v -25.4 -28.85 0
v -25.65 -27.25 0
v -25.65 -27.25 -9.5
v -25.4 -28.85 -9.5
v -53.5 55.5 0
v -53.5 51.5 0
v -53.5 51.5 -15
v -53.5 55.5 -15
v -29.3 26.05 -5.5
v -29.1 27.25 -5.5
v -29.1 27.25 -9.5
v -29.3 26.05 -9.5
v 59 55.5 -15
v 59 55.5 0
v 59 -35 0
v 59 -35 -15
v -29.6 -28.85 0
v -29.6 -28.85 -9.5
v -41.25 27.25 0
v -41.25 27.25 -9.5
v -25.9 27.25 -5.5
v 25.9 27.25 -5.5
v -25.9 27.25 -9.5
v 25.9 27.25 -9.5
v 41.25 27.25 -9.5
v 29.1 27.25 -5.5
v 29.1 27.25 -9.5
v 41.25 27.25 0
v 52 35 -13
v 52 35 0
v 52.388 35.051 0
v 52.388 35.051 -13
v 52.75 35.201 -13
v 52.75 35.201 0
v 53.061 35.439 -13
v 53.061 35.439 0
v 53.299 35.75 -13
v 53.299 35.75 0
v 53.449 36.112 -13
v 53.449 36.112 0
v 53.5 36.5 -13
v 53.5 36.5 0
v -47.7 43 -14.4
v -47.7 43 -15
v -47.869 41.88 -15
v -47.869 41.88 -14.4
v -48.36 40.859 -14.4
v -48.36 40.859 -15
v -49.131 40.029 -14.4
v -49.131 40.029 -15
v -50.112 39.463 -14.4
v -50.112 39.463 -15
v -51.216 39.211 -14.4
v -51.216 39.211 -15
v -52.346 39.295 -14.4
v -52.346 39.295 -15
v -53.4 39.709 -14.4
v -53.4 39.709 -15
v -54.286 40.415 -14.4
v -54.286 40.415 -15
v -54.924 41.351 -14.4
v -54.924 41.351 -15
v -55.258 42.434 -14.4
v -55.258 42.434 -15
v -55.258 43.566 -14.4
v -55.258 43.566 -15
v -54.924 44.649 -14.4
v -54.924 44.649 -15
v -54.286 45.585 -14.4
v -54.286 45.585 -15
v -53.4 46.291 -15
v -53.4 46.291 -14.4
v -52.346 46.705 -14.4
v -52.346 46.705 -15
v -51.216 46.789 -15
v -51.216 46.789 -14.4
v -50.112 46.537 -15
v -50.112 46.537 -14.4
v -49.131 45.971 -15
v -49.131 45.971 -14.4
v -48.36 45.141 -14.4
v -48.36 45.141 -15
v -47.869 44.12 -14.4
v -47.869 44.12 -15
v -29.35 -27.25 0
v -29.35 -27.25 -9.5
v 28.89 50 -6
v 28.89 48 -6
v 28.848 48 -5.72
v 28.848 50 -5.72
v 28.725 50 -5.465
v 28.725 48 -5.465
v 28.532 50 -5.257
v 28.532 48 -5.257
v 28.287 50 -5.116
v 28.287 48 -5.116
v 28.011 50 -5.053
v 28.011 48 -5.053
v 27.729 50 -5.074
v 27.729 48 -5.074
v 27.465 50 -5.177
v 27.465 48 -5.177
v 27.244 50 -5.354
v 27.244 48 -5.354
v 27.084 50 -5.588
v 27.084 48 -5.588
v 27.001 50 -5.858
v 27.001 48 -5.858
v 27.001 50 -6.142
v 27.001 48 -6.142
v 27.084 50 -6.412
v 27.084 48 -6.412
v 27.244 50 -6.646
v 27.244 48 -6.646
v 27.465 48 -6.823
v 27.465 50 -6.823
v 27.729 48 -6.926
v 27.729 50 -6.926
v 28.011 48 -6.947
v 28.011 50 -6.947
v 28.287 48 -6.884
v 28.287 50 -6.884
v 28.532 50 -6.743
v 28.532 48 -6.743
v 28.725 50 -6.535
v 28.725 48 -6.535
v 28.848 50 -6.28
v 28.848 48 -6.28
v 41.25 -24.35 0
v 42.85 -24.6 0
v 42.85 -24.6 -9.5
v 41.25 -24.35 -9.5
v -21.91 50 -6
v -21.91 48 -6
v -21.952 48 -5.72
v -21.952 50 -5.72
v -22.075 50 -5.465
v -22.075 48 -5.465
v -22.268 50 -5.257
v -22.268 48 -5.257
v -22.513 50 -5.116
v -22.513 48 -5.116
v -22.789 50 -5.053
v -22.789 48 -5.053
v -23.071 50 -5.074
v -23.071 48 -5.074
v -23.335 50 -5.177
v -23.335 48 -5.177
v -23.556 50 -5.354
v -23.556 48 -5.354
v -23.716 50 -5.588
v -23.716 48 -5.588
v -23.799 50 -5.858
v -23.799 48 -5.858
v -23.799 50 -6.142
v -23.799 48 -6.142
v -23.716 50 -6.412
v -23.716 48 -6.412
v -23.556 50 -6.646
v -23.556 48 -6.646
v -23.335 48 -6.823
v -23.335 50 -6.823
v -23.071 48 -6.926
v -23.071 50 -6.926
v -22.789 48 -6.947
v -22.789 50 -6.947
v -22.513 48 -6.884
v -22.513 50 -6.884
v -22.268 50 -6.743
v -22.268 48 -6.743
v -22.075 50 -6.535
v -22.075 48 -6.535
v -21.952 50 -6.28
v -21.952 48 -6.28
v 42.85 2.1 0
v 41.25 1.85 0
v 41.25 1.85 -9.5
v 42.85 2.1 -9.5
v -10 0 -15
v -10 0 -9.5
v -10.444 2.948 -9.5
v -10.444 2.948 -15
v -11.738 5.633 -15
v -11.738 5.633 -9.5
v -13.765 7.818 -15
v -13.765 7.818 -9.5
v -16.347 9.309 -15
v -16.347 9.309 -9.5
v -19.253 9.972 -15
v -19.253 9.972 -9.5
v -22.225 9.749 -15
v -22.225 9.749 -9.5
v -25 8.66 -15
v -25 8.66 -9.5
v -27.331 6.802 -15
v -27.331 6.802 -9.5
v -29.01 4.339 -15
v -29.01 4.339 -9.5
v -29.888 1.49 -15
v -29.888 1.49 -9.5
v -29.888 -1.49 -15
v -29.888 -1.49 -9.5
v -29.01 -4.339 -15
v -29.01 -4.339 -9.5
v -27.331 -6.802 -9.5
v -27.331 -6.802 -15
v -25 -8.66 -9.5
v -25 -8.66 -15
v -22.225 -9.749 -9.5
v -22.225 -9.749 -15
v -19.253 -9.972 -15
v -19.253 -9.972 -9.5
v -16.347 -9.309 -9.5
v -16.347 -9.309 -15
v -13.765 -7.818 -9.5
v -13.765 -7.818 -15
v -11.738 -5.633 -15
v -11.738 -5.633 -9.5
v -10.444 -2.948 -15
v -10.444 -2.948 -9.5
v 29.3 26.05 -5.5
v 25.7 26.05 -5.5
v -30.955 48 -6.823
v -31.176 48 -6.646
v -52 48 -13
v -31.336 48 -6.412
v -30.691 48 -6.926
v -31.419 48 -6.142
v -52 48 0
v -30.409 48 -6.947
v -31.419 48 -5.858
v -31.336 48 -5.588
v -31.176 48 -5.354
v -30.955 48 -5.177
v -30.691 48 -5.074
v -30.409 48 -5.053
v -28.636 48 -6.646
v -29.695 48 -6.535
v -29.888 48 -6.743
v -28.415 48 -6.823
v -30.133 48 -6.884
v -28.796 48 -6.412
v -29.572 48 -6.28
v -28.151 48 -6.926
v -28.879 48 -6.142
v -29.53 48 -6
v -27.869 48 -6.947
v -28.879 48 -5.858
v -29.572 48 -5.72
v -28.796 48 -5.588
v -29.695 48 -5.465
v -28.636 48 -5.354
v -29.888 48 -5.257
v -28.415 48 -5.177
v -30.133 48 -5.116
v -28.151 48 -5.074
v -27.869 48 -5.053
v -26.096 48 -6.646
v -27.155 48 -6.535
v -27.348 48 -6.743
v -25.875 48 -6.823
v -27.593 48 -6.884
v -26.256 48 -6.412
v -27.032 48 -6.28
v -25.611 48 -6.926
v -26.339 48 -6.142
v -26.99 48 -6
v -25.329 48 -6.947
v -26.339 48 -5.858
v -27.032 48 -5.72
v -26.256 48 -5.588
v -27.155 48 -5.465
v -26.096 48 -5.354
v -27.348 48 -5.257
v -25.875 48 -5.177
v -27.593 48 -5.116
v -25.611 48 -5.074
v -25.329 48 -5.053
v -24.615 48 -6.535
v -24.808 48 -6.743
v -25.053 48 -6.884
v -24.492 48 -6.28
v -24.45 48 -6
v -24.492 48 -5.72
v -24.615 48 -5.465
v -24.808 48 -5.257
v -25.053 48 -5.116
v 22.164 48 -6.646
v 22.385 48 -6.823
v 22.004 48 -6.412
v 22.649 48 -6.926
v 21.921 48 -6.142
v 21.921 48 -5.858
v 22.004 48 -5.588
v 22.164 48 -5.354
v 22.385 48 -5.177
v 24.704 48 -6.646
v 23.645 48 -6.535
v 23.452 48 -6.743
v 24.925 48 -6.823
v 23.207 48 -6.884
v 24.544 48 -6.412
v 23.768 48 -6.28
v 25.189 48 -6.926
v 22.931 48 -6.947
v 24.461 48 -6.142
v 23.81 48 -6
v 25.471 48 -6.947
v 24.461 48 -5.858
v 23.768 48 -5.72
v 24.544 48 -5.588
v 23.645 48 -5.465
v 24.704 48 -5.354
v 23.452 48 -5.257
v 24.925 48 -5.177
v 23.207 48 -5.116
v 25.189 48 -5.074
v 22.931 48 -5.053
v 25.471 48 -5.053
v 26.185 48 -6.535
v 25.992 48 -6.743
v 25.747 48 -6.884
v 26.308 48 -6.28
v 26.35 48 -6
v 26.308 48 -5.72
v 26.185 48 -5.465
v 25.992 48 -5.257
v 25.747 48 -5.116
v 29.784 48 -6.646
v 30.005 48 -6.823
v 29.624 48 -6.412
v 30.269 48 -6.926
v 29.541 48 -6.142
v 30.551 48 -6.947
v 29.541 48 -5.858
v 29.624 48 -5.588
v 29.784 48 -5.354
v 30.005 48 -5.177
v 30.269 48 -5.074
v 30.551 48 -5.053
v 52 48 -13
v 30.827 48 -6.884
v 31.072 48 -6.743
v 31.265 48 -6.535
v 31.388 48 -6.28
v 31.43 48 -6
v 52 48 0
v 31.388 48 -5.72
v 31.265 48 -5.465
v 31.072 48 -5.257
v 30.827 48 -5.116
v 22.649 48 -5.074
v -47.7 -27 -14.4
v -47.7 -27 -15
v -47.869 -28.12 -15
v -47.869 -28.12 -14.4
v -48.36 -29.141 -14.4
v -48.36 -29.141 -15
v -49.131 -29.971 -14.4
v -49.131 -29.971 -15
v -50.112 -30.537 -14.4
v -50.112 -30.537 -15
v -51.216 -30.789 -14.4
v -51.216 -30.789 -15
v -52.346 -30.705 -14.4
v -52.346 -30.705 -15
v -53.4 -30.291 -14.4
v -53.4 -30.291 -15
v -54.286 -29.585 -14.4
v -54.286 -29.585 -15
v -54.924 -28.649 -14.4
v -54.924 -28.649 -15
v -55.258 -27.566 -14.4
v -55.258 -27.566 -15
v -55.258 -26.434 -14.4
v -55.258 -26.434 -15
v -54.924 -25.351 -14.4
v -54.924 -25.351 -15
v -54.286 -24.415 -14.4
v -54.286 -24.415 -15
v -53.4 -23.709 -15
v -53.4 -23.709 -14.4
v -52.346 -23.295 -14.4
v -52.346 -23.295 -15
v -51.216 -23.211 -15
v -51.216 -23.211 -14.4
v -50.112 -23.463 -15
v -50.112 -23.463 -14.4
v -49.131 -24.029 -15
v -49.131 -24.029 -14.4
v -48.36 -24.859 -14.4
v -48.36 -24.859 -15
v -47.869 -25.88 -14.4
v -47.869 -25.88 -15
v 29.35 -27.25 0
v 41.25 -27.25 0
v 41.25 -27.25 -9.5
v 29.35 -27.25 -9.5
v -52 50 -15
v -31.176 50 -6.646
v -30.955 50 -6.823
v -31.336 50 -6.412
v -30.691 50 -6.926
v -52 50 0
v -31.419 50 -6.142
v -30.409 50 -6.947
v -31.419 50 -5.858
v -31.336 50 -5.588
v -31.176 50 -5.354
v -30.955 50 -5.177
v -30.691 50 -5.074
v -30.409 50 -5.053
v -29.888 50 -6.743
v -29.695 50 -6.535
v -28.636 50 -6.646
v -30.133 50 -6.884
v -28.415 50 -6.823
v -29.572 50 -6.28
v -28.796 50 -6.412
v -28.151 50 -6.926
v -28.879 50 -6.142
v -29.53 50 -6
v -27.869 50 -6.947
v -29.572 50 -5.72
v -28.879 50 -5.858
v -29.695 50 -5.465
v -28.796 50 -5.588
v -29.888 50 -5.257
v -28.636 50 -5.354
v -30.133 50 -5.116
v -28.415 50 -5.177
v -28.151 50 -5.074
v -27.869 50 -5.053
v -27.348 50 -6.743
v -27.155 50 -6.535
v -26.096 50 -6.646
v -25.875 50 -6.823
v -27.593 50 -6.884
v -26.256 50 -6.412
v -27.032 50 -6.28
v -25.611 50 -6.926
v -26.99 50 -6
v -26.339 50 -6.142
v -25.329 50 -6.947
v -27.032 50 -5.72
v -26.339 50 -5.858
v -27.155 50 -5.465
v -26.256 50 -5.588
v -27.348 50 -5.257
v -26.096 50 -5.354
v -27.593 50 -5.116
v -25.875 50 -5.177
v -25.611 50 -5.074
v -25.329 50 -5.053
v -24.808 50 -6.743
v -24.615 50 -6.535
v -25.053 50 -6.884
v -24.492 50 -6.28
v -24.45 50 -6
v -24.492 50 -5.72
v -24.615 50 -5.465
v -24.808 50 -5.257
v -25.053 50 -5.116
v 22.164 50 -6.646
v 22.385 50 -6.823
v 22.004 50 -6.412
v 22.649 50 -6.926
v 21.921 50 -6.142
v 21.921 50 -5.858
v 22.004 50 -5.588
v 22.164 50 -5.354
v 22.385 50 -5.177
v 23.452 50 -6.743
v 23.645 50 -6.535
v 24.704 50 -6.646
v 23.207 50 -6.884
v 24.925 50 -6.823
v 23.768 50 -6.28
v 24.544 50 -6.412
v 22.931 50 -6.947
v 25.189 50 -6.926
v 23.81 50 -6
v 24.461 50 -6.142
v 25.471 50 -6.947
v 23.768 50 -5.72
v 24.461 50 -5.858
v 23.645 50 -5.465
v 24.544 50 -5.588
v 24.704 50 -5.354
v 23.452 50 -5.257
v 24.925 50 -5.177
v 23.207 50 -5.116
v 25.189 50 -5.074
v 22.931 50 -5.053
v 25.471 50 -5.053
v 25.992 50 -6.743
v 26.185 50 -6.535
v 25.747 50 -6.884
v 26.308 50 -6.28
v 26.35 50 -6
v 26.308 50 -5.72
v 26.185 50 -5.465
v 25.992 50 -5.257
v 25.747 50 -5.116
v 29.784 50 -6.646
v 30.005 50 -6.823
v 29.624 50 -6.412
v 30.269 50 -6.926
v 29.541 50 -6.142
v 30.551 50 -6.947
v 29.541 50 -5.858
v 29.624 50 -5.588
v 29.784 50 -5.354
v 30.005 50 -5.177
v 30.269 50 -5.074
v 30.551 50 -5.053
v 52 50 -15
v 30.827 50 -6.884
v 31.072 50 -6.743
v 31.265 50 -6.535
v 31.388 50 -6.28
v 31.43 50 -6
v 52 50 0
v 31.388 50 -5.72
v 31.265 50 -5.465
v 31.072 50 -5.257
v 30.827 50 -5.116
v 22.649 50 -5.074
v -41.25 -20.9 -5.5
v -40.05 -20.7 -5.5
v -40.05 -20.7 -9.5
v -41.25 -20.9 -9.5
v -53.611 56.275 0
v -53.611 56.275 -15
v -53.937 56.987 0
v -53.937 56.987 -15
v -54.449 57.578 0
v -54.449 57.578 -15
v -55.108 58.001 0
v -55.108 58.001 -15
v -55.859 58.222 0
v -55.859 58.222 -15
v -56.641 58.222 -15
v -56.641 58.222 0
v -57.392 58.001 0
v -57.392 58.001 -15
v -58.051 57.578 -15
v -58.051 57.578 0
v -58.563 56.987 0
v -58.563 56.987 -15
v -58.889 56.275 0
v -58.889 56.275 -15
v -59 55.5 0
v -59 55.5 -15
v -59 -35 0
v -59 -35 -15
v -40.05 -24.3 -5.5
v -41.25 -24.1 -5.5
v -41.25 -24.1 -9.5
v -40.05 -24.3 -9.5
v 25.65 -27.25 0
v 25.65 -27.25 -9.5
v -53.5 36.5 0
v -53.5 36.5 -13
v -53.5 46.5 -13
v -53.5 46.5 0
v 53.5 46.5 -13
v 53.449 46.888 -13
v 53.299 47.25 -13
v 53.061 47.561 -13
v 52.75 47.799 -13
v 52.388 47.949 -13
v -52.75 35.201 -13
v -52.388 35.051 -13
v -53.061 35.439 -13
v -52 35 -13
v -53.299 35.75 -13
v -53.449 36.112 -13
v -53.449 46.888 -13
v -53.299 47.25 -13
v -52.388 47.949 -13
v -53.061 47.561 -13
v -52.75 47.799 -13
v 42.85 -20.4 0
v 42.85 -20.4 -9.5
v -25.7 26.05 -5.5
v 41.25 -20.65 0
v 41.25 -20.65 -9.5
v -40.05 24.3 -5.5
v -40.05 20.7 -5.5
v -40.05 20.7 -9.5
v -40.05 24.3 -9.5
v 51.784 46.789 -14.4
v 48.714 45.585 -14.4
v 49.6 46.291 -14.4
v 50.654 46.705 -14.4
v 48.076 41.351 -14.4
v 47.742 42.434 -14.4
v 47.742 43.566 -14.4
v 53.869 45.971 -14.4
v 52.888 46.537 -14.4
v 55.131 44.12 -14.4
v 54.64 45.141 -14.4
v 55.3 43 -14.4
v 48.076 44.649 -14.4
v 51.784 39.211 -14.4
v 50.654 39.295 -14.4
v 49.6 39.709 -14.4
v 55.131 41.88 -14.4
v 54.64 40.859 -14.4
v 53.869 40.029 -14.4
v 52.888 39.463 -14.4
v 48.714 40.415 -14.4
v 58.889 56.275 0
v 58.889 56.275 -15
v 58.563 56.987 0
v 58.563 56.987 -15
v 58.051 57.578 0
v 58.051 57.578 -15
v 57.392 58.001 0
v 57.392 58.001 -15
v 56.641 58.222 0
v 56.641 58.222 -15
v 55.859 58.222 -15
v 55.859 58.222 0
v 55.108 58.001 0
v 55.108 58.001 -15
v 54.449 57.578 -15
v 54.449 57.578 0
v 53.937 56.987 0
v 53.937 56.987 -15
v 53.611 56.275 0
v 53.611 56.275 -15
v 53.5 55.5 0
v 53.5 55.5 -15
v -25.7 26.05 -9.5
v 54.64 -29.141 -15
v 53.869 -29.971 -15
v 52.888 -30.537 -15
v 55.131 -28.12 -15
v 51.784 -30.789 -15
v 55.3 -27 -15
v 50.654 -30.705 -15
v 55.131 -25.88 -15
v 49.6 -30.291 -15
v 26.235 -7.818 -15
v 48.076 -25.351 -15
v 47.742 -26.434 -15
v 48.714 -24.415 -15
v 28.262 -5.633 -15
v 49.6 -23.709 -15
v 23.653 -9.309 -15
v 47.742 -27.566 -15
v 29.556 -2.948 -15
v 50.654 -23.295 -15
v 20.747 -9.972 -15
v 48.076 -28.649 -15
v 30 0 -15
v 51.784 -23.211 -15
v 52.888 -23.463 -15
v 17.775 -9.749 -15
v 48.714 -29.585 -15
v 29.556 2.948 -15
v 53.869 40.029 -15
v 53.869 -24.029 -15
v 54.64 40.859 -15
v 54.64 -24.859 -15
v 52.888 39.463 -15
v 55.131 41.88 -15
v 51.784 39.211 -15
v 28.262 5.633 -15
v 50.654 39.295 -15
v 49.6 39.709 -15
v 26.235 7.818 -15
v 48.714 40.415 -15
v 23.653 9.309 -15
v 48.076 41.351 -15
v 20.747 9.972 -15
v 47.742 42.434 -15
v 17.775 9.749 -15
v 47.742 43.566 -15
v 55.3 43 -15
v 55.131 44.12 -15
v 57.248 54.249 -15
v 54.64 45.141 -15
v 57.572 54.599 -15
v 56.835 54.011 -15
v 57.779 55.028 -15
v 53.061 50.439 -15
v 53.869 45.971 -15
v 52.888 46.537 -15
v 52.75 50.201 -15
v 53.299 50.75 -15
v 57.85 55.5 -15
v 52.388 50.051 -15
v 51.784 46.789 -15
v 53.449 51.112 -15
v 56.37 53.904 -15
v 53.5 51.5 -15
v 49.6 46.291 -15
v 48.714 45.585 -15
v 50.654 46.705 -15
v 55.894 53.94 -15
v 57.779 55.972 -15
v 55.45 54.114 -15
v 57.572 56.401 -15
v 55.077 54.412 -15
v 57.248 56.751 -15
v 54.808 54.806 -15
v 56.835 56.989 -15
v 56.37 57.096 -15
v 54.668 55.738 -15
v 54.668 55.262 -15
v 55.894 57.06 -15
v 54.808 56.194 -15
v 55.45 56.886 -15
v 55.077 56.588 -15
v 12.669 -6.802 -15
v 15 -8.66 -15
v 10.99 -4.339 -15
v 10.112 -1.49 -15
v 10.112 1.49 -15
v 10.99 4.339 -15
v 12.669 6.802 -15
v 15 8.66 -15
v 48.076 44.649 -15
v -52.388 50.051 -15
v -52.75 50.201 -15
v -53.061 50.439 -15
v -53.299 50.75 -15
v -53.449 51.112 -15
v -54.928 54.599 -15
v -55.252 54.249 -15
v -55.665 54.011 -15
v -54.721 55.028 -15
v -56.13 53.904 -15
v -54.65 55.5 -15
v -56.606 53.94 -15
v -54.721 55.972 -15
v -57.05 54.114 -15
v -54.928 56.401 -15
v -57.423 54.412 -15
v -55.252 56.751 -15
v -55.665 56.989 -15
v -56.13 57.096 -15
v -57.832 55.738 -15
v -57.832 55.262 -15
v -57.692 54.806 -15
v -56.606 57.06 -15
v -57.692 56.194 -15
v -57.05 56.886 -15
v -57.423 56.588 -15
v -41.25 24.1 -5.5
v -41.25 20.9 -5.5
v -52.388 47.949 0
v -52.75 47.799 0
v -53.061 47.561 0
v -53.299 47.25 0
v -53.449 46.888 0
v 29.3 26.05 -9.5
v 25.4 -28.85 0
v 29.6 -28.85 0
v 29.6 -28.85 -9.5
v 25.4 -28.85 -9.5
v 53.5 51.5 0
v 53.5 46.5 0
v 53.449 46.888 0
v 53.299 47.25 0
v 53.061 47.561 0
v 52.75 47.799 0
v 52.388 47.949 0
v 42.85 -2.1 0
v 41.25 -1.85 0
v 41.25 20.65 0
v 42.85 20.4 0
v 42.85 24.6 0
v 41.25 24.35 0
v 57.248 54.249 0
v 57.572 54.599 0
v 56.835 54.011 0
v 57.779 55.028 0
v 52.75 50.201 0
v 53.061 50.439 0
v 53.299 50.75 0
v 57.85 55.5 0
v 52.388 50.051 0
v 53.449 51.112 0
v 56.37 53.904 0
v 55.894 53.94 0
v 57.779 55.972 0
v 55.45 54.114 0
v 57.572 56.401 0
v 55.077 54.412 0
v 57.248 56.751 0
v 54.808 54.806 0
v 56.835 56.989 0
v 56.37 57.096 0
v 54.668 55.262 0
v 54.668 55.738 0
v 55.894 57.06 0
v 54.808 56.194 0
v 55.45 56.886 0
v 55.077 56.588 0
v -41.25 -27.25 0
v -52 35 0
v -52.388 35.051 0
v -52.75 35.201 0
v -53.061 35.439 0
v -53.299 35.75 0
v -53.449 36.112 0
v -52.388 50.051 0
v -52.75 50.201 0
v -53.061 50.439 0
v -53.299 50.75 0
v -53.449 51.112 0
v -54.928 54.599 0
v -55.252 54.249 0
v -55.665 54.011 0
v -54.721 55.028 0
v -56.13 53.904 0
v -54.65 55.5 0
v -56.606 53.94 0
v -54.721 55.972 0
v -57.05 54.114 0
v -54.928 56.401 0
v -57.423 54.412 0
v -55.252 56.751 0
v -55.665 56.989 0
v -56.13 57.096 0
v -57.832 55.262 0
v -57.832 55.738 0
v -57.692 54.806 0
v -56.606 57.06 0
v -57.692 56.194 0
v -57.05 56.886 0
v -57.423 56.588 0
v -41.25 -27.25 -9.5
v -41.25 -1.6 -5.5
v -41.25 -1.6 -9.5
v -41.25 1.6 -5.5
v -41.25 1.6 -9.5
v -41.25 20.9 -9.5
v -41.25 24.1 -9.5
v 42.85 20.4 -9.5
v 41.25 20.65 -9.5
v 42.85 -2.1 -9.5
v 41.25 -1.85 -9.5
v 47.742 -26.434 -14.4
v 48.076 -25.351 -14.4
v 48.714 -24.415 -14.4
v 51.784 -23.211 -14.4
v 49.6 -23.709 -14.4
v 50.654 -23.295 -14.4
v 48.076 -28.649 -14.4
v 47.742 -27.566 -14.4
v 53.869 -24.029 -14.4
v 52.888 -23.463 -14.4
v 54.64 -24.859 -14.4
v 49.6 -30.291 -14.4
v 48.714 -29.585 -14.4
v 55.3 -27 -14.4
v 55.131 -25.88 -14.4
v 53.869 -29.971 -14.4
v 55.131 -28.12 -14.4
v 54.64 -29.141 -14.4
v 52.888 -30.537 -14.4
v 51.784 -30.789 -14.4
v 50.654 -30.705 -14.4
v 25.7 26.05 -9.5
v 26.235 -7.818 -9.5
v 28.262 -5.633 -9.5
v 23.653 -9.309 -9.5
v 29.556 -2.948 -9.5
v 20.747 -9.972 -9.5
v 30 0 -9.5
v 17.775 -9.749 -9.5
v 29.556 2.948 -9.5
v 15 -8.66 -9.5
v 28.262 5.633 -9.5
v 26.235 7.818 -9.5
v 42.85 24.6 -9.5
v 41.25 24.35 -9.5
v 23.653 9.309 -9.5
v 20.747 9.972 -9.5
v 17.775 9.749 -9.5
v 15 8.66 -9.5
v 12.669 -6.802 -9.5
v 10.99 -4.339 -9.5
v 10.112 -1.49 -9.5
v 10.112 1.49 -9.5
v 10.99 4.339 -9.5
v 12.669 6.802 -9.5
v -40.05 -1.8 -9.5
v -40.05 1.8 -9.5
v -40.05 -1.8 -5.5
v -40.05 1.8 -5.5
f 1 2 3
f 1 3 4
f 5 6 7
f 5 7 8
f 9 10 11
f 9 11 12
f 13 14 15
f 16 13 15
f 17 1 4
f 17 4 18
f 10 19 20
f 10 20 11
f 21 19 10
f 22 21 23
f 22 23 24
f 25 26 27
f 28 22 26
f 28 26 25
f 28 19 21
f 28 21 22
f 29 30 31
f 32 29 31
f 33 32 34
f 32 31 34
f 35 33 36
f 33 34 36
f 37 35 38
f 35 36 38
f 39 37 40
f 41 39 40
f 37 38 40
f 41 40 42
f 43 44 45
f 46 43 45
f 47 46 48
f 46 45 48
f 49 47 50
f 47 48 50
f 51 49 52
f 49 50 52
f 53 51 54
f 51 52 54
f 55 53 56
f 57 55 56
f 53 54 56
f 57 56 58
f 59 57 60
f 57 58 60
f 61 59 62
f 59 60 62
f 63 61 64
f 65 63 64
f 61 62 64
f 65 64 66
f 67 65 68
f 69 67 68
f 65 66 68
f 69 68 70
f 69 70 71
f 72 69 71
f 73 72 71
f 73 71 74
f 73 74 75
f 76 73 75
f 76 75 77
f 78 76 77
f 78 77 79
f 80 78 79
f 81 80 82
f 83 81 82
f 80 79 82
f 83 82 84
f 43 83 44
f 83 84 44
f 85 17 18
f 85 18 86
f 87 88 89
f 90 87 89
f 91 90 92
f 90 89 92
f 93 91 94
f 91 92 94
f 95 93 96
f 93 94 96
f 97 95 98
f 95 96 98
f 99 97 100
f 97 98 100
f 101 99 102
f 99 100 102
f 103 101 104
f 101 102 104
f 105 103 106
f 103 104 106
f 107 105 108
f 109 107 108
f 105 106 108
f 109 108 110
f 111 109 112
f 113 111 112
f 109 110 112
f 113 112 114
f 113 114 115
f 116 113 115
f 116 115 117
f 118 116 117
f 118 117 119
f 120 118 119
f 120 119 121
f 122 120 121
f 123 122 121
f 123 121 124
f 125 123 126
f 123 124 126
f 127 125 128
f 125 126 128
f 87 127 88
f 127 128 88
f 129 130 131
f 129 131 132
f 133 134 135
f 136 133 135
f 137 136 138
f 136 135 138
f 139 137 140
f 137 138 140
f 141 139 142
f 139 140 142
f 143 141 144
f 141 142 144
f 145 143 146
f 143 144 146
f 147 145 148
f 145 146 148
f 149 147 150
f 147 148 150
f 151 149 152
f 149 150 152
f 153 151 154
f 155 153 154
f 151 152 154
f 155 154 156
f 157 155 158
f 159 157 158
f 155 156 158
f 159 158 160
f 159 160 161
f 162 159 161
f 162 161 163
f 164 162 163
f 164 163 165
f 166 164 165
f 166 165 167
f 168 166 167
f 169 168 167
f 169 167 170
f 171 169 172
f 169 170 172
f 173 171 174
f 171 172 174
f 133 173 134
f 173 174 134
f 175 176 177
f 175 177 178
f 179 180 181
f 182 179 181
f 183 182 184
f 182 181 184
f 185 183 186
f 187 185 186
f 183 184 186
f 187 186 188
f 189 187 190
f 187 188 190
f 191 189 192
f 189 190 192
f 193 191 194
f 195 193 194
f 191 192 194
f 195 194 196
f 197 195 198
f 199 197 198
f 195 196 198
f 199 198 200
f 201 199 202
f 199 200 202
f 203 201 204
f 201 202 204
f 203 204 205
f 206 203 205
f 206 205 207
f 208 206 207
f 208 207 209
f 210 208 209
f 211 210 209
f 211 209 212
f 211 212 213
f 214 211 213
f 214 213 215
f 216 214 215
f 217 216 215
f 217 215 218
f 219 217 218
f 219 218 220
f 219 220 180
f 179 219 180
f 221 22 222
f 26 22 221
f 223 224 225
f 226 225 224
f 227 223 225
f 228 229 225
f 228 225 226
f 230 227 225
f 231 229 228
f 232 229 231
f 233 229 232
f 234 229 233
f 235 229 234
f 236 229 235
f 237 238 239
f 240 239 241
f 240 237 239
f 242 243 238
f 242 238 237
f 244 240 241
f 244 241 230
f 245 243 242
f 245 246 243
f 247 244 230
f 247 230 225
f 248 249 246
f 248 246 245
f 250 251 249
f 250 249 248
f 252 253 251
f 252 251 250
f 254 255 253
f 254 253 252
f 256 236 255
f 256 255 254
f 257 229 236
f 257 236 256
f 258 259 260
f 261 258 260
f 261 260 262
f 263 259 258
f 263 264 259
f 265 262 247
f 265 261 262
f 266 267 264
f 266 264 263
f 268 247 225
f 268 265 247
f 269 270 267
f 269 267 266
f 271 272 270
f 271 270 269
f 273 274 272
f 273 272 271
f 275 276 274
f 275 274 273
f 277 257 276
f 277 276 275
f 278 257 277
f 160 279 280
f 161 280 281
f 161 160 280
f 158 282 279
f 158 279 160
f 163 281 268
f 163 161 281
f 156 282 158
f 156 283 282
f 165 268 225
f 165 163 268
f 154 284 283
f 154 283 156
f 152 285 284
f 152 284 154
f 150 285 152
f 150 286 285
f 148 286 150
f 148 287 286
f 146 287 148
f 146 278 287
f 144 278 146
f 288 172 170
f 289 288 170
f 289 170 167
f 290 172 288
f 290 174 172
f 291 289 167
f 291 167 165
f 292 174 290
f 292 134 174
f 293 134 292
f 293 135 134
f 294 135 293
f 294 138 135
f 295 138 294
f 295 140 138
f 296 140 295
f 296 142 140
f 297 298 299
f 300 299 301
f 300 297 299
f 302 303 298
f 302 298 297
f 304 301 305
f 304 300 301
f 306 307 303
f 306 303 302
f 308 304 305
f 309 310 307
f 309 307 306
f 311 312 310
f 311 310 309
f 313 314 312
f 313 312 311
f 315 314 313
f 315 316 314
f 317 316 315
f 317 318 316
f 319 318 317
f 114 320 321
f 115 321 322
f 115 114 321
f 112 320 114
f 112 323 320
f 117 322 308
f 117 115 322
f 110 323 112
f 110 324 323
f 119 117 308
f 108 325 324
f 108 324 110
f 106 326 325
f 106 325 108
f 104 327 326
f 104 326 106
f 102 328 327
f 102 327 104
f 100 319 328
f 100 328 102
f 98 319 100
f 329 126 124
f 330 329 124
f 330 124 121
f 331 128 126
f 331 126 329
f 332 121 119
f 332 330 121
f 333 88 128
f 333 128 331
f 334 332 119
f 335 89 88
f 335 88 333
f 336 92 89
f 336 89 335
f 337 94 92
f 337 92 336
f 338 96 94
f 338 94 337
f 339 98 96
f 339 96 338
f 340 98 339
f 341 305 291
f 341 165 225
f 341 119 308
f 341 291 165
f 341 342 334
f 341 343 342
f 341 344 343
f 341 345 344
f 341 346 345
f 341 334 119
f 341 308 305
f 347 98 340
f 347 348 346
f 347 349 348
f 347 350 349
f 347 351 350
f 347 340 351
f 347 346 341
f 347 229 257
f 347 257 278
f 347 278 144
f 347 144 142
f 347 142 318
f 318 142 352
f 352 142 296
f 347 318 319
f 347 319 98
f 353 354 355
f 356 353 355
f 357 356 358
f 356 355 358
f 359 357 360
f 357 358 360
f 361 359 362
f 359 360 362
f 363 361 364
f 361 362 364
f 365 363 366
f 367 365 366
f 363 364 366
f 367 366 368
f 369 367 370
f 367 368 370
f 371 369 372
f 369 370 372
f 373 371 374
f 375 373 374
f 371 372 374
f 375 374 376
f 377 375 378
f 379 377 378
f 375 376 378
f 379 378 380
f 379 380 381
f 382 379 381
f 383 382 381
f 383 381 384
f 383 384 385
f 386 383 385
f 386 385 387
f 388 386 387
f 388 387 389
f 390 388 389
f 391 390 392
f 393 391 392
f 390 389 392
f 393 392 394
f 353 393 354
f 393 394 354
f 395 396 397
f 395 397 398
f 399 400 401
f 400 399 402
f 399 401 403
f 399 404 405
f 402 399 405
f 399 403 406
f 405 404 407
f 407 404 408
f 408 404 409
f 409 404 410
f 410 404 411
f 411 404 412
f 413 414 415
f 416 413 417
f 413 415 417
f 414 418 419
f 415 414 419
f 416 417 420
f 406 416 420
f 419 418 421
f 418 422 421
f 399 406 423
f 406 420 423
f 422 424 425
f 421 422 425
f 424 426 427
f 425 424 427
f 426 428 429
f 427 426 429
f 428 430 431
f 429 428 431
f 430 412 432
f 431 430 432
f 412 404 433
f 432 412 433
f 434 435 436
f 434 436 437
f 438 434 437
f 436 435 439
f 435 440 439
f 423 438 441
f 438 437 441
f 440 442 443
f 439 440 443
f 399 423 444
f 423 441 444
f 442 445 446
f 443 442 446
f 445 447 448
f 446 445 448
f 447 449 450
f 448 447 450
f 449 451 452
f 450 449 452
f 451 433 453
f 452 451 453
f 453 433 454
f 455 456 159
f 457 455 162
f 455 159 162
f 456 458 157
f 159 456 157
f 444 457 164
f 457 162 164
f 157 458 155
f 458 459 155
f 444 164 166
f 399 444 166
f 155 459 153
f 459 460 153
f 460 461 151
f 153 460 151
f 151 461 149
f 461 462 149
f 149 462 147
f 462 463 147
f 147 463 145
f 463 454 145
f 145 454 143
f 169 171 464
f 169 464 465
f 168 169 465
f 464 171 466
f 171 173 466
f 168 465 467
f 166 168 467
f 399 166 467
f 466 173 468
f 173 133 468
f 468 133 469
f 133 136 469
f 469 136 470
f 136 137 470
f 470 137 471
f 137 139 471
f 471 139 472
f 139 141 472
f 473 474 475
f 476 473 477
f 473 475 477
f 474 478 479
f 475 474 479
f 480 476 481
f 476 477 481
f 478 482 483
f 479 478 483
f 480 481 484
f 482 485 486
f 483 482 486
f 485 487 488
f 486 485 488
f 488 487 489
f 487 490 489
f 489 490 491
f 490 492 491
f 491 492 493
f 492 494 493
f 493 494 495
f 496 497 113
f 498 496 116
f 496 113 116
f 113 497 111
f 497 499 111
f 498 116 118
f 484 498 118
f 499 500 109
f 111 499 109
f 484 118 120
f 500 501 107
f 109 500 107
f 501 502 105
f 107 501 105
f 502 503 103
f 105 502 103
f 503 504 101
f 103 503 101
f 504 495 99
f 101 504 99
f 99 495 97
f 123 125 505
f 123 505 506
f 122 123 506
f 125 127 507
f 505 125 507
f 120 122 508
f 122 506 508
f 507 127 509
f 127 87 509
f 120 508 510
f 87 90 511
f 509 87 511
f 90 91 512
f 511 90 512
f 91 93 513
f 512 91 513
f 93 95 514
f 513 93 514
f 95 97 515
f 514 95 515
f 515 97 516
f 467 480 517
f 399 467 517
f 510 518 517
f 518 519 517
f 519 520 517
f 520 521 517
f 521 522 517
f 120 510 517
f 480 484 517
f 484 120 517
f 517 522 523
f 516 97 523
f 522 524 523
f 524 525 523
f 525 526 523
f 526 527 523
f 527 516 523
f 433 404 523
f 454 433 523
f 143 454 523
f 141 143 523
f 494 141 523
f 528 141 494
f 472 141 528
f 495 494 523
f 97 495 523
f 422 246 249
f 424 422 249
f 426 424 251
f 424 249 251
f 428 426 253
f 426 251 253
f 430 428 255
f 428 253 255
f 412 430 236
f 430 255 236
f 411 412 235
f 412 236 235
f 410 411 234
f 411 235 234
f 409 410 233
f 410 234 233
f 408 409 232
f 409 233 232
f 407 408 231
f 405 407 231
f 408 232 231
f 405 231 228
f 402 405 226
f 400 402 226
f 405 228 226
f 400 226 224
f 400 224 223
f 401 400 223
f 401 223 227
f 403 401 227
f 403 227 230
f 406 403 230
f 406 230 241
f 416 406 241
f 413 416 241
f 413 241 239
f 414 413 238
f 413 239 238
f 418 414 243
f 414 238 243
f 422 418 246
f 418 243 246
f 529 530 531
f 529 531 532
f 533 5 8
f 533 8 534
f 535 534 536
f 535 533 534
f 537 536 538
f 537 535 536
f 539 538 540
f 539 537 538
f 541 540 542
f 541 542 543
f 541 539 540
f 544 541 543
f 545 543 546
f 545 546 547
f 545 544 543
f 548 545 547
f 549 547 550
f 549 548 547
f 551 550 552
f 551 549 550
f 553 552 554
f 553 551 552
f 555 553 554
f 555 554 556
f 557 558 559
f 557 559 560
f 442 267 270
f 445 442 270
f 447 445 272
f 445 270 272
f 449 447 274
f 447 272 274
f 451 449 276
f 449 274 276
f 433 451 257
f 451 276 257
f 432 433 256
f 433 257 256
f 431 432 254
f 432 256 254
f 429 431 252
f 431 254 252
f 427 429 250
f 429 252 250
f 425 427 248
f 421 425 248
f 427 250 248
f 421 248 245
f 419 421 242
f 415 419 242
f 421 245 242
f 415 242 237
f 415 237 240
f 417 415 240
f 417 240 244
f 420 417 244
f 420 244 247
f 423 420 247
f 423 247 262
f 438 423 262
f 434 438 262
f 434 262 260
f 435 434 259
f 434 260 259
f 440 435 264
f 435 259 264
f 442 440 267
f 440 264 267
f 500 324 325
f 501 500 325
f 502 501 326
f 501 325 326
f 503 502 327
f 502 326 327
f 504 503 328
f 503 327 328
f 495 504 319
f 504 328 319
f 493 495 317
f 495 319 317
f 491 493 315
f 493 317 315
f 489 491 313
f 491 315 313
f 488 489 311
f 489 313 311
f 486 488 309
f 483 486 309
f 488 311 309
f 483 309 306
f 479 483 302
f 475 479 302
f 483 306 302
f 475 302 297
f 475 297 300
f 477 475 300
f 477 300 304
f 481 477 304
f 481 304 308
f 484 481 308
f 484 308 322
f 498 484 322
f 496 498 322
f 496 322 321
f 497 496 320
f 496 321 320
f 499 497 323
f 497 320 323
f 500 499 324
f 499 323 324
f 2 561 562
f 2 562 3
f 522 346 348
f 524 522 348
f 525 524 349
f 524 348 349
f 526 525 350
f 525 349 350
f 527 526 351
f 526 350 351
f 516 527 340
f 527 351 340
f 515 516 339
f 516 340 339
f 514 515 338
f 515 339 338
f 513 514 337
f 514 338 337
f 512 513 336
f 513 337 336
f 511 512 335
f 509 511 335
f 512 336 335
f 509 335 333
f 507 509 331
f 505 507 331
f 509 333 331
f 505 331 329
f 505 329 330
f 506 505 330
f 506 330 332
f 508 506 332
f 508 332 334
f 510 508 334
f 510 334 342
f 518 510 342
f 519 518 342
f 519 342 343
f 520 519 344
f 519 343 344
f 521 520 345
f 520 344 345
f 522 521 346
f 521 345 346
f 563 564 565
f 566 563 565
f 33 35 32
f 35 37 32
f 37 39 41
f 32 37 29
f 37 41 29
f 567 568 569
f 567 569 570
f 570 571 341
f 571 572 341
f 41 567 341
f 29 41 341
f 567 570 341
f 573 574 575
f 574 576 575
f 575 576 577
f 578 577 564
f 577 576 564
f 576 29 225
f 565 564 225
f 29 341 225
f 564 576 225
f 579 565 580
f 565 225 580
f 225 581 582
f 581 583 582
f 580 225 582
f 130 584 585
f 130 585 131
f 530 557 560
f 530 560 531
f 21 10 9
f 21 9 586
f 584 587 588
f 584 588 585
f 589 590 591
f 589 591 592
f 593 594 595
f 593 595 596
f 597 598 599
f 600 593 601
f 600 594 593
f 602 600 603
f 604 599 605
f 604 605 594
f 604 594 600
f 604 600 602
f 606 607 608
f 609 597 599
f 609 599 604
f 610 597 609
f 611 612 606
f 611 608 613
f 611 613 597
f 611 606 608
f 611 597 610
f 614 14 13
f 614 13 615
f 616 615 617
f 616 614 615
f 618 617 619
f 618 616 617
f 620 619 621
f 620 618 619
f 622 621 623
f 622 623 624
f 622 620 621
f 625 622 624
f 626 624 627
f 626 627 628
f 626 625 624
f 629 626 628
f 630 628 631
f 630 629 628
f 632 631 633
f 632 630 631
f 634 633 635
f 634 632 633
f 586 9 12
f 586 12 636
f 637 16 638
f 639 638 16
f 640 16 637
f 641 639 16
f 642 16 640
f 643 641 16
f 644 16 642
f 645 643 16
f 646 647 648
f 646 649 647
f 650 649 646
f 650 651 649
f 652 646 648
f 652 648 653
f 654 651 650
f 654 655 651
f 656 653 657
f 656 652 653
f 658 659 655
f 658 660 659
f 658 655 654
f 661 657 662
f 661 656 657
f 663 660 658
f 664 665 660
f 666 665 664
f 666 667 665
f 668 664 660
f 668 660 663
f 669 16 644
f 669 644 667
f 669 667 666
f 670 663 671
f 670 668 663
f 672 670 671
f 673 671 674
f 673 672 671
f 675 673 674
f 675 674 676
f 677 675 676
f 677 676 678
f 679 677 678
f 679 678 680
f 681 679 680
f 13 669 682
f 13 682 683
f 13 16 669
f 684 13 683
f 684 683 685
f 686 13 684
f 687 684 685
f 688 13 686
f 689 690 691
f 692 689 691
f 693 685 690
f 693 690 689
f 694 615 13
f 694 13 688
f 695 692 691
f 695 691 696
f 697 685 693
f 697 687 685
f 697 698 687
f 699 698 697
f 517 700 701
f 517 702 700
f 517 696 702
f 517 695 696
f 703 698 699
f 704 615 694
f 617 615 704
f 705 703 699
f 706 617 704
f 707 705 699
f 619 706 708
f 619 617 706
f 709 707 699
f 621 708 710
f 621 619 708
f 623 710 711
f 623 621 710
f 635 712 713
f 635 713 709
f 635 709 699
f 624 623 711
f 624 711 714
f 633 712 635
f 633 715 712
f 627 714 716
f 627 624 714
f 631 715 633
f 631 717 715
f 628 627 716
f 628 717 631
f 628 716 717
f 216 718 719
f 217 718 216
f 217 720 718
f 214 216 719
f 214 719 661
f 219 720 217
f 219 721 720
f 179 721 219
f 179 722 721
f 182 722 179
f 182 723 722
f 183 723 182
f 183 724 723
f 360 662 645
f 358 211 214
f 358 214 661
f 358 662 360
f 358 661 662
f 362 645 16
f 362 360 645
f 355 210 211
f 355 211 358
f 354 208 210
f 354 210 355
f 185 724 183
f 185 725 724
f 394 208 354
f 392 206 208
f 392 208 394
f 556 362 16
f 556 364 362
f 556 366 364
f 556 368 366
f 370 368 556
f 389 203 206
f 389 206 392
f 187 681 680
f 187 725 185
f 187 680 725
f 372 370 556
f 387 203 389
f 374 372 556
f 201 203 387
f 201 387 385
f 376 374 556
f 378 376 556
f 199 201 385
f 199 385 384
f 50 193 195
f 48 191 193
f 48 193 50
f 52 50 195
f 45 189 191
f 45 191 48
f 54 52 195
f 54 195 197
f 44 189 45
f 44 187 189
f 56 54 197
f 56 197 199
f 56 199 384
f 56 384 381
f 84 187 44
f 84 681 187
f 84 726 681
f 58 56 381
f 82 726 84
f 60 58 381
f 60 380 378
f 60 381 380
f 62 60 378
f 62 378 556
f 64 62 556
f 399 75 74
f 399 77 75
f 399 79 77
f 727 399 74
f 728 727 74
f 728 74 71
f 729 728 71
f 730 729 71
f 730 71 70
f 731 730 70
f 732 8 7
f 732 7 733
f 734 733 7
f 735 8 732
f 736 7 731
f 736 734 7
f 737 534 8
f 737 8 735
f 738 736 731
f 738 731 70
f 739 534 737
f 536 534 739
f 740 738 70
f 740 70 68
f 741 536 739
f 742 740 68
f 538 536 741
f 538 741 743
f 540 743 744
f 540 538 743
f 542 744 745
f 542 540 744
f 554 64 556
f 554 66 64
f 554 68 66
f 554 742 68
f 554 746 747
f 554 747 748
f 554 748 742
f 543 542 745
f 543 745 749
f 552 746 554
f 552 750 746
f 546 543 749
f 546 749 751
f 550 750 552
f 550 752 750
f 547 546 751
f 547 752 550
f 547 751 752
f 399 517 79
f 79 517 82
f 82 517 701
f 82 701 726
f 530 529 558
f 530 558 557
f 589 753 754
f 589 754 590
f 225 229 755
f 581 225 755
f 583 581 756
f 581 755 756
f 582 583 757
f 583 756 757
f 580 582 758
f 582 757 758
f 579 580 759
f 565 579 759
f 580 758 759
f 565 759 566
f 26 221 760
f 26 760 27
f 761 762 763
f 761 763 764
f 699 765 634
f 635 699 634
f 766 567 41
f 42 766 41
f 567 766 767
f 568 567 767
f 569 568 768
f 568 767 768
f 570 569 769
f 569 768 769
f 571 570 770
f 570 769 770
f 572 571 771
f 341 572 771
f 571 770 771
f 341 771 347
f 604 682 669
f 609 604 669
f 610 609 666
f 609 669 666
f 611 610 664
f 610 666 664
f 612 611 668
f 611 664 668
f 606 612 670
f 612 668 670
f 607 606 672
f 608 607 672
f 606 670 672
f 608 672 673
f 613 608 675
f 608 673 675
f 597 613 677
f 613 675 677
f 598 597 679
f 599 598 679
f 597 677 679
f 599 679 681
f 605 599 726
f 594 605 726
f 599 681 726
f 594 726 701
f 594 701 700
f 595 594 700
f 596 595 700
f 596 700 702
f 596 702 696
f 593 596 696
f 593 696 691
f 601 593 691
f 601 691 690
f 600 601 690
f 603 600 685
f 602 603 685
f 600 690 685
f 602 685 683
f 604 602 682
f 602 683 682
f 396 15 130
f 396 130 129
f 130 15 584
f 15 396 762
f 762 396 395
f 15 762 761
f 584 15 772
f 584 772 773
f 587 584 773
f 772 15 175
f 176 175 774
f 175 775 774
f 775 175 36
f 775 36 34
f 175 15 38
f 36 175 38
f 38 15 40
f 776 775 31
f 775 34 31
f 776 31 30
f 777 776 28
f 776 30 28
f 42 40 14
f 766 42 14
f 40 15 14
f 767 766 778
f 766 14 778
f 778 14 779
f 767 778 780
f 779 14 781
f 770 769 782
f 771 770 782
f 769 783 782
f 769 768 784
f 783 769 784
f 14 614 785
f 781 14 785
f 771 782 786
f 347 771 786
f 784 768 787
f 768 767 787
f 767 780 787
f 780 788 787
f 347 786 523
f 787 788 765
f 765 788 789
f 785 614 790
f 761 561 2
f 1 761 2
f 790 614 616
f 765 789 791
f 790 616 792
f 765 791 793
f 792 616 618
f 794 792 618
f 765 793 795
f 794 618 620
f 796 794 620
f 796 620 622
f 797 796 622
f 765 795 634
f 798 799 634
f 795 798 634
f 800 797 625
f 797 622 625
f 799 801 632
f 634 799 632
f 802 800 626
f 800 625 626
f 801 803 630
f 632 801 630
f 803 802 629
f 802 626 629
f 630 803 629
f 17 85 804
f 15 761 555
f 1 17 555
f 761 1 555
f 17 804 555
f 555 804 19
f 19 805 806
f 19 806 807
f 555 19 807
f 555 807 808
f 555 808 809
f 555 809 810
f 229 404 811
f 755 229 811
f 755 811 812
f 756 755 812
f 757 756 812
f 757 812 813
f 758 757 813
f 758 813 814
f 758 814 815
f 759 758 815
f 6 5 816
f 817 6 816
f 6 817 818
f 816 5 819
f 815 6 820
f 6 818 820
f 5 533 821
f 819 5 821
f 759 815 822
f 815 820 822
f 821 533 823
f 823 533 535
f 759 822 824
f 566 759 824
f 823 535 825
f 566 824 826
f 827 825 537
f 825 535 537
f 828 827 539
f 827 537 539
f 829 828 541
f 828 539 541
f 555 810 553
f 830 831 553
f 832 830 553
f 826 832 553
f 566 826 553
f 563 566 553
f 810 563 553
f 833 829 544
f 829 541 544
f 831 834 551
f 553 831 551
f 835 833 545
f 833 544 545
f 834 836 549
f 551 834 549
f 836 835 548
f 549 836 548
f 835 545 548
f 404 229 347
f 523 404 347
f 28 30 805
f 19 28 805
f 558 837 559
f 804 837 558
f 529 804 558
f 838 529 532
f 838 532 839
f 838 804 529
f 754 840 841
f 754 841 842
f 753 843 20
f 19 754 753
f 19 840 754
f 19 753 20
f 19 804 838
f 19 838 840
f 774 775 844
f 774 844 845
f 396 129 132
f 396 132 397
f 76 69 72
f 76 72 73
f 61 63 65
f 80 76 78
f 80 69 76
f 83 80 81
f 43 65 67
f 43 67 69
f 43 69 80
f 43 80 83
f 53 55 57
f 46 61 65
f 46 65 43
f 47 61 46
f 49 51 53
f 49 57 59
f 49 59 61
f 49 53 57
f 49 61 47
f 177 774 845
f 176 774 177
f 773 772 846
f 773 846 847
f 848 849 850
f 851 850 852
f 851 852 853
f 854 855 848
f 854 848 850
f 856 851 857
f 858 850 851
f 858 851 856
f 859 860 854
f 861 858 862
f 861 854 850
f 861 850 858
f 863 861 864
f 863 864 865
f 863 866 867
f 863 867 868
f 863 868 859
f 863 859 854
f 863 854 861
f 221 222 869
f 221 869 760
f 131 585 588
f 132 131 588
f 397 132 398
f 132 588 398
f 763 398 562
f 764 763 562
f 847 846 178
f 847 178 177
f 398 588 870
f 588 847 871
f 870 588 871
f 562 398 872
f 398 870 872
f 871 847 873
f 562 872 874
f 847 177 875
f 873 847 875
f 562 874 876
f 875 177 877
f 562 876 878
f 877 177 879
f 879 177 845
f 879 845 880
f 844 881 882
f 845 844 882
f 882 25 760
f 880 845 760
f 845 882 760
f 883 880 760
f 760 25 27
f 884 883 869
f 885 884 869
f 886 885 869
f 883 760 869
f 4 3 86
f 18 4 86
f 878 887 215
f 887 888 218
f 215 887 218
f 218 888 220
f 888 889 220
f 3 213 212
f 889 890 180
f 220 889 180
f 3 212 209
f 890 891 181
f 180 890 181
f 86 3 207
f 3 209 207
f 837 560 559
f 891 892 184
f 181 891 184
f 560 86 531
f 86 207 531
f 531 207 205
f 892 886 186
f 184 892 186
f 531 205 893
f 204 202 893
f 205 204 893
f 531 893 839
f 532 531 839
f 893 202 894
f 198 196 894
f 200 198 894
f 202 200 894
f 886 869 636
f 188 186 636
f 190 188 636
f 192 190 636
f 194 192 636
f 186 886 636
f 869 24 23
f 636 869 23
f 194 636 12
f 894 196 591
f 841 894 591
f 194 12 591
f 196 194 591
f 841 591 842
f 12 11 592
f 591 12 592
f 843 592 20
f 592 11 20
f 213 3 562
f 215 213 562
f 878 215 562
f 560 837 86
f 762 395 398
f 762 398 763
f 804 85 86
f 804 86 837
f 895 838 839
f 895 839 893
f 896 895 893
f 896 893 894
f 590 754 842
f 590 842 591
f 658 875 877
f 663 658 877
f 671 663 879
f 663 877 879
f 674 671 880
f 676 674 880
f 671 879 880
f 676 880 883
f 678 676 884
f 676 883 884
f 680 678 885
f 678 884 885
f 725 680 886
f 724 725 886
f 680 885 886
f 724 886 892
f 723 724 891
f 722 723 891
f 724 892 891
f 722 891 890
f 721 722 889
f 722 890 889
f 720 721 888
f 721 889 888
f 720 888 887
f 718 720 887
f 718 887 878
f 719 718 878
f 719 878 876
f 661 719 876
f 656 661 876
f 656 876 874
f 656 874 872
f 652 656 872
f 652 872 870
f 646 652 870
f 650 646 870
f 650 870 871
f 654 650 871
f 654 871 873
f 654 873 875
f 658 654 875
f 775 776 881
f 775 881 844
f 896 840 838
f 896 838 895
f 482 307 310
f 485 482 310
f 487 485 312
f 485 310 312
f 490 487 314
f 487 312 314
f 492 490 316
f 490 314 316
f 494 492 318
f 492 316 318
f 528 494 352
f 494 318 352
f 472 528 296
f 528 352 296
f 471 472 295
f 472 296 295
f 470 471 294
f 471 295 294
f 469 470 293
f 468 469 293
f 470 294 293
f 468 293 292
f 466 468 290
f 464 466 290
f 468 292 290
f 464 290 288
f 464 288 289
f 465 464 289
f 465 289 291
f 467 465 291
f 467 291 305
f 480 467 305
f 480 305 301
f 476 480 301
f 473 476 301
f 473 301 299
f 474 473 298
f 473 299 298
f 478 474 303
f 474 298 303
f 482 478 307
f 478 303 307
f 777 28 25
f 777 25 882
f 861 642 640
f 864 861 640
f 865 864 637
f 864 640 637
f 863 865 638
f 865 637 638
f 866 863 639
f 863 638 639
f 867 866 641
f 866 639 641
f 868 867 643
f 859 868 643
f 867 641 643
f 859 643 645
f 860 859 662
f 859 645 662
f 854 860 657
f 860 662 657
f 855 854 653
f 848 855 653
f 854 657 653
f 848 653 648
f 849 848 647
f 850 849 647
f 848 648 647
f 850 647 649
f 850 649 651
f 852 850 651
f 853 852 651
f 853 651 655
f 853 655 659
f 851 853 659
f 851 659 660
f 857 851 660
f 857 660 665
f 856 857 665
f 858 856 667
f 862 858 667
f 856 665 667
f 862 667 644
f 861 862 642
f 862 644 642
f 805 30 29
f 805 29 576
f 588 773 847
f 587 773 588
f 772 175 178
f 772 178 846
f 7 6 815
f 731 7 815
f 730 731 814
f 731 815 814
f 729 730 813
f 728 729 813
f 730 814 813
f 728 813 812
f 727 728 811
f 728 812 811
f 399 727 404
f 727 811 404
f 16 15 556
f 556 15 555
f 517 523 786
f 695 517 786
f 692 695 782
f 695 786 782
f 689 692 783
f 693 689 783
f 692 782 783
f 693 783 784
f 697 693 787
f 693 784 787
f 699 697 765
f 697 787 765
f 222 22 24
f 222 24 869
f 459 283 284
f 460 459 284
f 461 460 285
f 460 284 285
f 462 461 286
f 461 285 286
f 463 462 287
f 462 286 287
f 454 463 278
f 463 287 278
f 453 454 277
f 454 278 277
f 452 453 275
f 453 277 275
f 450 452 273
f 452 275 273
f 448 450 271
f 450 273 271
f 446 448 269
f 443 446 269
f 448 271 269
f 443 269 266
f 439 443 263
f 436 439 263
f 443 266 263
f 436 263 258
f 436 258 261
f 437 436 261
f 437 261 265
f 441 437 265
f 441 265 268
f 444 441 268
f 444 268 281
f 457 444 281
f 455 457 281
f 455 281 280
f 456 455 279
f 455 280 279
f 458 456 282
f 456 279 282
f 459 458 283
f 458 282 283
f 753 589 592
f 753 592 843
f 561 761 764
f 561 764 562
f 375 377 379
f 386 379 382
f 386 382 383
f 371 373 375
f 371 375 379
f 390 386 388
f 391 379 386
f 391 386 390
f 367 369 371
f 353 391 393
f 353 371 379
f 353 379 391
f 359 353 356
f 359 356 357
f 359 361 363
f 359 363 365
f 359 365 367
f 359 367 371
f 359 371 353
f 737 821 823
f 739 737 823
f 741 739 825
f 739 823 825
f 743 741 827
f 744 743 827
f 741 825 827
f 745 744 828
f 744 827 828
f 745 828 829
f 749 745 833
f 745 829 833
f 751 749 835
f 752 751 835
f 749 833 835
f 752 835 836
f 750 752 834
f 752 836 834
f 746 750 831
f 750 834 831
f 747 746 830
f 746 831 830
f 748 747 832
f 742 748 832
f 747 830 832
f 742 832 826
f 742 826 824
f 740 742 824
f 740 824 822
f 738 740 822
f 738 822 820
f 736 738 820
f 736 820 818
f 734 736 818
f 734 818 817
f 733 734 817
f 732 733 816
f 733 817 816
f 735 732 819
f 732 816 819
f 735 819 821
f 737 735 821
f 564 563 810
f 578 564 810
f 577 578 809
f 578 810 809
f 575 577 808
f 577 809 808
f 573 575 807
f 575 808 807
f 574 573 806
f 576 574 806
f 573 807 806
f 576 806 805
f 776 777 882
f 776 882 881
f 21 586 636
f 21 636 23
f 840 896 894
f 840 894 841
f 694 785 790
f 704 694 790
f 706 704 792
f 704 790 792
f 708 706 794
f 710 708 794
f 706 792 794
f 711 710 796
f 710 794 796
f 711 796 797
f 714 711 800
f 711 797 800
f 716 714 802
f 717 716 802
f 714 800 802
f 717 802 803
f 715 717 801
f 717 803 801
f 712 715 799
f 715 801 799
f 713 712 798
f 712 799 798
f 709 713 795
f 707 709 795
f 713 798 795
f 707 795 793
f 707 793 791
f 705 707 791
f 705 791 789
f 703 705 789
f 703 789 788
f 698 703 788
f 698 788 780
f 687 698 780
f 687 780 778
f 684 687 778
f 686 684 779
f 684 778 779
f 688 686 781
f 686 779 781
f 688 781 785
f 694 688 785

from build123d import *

# Parameters (mm, degrees)
PAD001_DEPTH    = 9.5
SKETCH_R        = 1.6
PAD_DEPTH       = 15
POCKET_DEPTH    = 13
SKETCH003_R     = 10
POCKET001_DEPTH = 15.001
SKETCH004_R     = 0.95
POCKET002_DEPTH = 2
SKETCH005_R     = 3.8
POCKET003_DEPTH = 0.6
SKETCH007_W     = 73.88
SKETCH007_H     = 52.42
POCKET004_DEPTH = 5.5


with BuildPart() as feature_breadboard:
    # Sketch006 → Pad001 (new body)
    with BuildSketch(Plane.XY):
        Polygon((-41.25, 27.25), (-29.1, 27.25), (-29.3, 26.05), (-25.7, 26.05), (-25.9, 27.25), (25.9, 27.25), (25.7, 26.05), (29.3, 26.05), (29.1, 27.25), (41.25, 27.25), (41.25, 24.35), (42.85, 24.6), (42.85, 20.4), (41.25, 20.65), (41.25, 1.85), (42.85, 2.1), (42.85, -2.1), (41.25, -1.85), (41.25, -20.65), (42.85, -20.4), (42.85, -24.6), (41.25, -24.35), (41.25, -27.25), (29.35, -27.25), (29.6, -28.85), (25.4, -28.85), (25.65, -27.25), (-25.65, -27.25), (-25.4, -28.85), (-29.6, -28.85), (-29.35, -27.25), (-41.25, -27.25), (-41.25, -24.1), (-40.05, -24.3), (-40.05, -20.7), (-41.25, -20.9), (-41.25, -1.6), (-40.05, -1.8), (-40.05, 1.8), (-41.25, 1.6), (-41.25, 20.9), (-40.05, 20.7), (-40.05, 24.3), (-41.25, 24.1), align=None)
    extrude(amount=-PAD001_DEPTH)


with BuildPart() as body:
    # Sketch → Pad (new body)
    with BuildSketch(Plane.XY):
        with BuildLine():
            Line((-52, 50), (52, 50))
            ThreePointArc((52, 50), (53.06066, 50.43934), (53.5, 51.5))
            Line((53.5, 51.5), (53.5, 55.5))
            ThreePointArc((59, 55.5), (56.25, 58.25), (53.5, 55.5))
            Line((59, 55.5), (59, -35))
            Line((59, -35), (-59, -35))
            Line((-59, 55.5), (-59, -35))
            ThreePointArc((-53.5, 55.5), (-56.25, 58.25), (-59, 55.5))
            Line((-53.5, 51.5), (-53.5, 55.5))
            ThreePointArc((-53.5, 51.5), (-53.06066, 50.43934), (-52, 50))
        make_face()
        with Locations((-56.25, 55.5)):
            Circle(SKETCH_R, mode=Mode.SUBTRACT)
        with Locations((56.25, 55.5)):
            Circle(SKETCH_R, mode=Mode.SUBTRACT)
    extrude(amount=-PAD_DEPTH)

    # Sketch001 (on Face13 of Pad) → Pocket (cut)
    with BuildSketch(Plane.XY):
        with BuildLine():
            Line((-52, 48), (52, 48))
            ThreePointArc((53.5, 46.5), (53.06066, 47.56066), (52, 48))
            Line((53.5, 46.5), (53.5, 36.5))
            ThreePointArc((52, 35), (53.06066, 35.43934), (53.5, 36.5))
            Line((52, 35), (-52, 35))
            ThreePointArc((-53.5, 36.5), (-53.06066, 35.43934), (-52, 35))
            Line((-53.5, 36.5), (-53.5, 46.5))
            ThreePointArc((-52, 48), (-53.06066, 47.56066), (-53.5, 46.5))
        make_face()
    extrude(amount=-POCKET_DEPTH, mode=Mode.SUBTRACT)

    # Sketch003 (on Face4 of Pocket) → Pocket001 (cut, through all)
    with BuildSketch(Plane.XY):
        with Locations((-20, 0)):
            Circle(SKETCH003_R)
        with Locations((20, 0)):
            Circle(SKETCH003_R)
    extrude(amount=-POCKET001_DEPTH, mode=Mode.SUBTRACT)

    # Sketch004 (on Face18 of Pocket001) → Pocket002 (cut)
    with BuildSketch(Plane.XZ.offset(-48)):
        with Locations((-30.48, -6)):
            Circle(SKETCH004_R)
        with Locations((-27.94, -6)):
            Circle(SKETCH004_R)
        with Locations((-25.4, -6)):
            Circle(SKETCH004_R)
        with Locations((-22.86, -6)):
            Circle(SKETCH004_R)
        with Locations((22.86, -6)):
            Circle(SKETCH004_R)
        with Locations((25.4, -6)):
            Circle(SKETCH004_R)
        with Locations((27.94, -6)):
            Circle(SKETCH004_R)
        with Locations((30.48, -6)):
            Circle(SKETCH004_R)
    extrude(amount=-POCKET002_DEPTH, mode=Mode.SUBTRACT)

    # Sketch005 (on Face5 of Pocket002) → Pocket003 (cut)
    with BuildSketch(Plane(origin=(0, 0, -15), x_dir=(1, 0, 0), z_dir=(0, 0, -1))):
        with Locations((-51.5, 27)):
            Circle(SKETCH005_R)
        with Locations((-51.5, -43)):
            Circle(SKETCH005_R)
        with Locations((51.5, -43)):
            Circle(SKETCH005_R)
        with Locations((51.5, 27)):
            Circle(SKETCH005_R)
    extrude(amount=-POCKET003_DEPTH, mode=Mode.SUBTRACT)

    # Boolean: cut feature_breadboard
    add(feature_breadboard.part, mode=Mode.SUBTRACT)

    # Sketch007 (on Face4 of Boolean) → Pocket004 (cut)
    with BuildSketch(Plane.XY):
        with Locations((-4.31, 1.04)):
            Rectangle(SKETCH007_W, SKETCH007_H)
    extrude(amount=-POCKET004_DEPTH, mode=Mode.SUBTRACT)


solid = body.part
